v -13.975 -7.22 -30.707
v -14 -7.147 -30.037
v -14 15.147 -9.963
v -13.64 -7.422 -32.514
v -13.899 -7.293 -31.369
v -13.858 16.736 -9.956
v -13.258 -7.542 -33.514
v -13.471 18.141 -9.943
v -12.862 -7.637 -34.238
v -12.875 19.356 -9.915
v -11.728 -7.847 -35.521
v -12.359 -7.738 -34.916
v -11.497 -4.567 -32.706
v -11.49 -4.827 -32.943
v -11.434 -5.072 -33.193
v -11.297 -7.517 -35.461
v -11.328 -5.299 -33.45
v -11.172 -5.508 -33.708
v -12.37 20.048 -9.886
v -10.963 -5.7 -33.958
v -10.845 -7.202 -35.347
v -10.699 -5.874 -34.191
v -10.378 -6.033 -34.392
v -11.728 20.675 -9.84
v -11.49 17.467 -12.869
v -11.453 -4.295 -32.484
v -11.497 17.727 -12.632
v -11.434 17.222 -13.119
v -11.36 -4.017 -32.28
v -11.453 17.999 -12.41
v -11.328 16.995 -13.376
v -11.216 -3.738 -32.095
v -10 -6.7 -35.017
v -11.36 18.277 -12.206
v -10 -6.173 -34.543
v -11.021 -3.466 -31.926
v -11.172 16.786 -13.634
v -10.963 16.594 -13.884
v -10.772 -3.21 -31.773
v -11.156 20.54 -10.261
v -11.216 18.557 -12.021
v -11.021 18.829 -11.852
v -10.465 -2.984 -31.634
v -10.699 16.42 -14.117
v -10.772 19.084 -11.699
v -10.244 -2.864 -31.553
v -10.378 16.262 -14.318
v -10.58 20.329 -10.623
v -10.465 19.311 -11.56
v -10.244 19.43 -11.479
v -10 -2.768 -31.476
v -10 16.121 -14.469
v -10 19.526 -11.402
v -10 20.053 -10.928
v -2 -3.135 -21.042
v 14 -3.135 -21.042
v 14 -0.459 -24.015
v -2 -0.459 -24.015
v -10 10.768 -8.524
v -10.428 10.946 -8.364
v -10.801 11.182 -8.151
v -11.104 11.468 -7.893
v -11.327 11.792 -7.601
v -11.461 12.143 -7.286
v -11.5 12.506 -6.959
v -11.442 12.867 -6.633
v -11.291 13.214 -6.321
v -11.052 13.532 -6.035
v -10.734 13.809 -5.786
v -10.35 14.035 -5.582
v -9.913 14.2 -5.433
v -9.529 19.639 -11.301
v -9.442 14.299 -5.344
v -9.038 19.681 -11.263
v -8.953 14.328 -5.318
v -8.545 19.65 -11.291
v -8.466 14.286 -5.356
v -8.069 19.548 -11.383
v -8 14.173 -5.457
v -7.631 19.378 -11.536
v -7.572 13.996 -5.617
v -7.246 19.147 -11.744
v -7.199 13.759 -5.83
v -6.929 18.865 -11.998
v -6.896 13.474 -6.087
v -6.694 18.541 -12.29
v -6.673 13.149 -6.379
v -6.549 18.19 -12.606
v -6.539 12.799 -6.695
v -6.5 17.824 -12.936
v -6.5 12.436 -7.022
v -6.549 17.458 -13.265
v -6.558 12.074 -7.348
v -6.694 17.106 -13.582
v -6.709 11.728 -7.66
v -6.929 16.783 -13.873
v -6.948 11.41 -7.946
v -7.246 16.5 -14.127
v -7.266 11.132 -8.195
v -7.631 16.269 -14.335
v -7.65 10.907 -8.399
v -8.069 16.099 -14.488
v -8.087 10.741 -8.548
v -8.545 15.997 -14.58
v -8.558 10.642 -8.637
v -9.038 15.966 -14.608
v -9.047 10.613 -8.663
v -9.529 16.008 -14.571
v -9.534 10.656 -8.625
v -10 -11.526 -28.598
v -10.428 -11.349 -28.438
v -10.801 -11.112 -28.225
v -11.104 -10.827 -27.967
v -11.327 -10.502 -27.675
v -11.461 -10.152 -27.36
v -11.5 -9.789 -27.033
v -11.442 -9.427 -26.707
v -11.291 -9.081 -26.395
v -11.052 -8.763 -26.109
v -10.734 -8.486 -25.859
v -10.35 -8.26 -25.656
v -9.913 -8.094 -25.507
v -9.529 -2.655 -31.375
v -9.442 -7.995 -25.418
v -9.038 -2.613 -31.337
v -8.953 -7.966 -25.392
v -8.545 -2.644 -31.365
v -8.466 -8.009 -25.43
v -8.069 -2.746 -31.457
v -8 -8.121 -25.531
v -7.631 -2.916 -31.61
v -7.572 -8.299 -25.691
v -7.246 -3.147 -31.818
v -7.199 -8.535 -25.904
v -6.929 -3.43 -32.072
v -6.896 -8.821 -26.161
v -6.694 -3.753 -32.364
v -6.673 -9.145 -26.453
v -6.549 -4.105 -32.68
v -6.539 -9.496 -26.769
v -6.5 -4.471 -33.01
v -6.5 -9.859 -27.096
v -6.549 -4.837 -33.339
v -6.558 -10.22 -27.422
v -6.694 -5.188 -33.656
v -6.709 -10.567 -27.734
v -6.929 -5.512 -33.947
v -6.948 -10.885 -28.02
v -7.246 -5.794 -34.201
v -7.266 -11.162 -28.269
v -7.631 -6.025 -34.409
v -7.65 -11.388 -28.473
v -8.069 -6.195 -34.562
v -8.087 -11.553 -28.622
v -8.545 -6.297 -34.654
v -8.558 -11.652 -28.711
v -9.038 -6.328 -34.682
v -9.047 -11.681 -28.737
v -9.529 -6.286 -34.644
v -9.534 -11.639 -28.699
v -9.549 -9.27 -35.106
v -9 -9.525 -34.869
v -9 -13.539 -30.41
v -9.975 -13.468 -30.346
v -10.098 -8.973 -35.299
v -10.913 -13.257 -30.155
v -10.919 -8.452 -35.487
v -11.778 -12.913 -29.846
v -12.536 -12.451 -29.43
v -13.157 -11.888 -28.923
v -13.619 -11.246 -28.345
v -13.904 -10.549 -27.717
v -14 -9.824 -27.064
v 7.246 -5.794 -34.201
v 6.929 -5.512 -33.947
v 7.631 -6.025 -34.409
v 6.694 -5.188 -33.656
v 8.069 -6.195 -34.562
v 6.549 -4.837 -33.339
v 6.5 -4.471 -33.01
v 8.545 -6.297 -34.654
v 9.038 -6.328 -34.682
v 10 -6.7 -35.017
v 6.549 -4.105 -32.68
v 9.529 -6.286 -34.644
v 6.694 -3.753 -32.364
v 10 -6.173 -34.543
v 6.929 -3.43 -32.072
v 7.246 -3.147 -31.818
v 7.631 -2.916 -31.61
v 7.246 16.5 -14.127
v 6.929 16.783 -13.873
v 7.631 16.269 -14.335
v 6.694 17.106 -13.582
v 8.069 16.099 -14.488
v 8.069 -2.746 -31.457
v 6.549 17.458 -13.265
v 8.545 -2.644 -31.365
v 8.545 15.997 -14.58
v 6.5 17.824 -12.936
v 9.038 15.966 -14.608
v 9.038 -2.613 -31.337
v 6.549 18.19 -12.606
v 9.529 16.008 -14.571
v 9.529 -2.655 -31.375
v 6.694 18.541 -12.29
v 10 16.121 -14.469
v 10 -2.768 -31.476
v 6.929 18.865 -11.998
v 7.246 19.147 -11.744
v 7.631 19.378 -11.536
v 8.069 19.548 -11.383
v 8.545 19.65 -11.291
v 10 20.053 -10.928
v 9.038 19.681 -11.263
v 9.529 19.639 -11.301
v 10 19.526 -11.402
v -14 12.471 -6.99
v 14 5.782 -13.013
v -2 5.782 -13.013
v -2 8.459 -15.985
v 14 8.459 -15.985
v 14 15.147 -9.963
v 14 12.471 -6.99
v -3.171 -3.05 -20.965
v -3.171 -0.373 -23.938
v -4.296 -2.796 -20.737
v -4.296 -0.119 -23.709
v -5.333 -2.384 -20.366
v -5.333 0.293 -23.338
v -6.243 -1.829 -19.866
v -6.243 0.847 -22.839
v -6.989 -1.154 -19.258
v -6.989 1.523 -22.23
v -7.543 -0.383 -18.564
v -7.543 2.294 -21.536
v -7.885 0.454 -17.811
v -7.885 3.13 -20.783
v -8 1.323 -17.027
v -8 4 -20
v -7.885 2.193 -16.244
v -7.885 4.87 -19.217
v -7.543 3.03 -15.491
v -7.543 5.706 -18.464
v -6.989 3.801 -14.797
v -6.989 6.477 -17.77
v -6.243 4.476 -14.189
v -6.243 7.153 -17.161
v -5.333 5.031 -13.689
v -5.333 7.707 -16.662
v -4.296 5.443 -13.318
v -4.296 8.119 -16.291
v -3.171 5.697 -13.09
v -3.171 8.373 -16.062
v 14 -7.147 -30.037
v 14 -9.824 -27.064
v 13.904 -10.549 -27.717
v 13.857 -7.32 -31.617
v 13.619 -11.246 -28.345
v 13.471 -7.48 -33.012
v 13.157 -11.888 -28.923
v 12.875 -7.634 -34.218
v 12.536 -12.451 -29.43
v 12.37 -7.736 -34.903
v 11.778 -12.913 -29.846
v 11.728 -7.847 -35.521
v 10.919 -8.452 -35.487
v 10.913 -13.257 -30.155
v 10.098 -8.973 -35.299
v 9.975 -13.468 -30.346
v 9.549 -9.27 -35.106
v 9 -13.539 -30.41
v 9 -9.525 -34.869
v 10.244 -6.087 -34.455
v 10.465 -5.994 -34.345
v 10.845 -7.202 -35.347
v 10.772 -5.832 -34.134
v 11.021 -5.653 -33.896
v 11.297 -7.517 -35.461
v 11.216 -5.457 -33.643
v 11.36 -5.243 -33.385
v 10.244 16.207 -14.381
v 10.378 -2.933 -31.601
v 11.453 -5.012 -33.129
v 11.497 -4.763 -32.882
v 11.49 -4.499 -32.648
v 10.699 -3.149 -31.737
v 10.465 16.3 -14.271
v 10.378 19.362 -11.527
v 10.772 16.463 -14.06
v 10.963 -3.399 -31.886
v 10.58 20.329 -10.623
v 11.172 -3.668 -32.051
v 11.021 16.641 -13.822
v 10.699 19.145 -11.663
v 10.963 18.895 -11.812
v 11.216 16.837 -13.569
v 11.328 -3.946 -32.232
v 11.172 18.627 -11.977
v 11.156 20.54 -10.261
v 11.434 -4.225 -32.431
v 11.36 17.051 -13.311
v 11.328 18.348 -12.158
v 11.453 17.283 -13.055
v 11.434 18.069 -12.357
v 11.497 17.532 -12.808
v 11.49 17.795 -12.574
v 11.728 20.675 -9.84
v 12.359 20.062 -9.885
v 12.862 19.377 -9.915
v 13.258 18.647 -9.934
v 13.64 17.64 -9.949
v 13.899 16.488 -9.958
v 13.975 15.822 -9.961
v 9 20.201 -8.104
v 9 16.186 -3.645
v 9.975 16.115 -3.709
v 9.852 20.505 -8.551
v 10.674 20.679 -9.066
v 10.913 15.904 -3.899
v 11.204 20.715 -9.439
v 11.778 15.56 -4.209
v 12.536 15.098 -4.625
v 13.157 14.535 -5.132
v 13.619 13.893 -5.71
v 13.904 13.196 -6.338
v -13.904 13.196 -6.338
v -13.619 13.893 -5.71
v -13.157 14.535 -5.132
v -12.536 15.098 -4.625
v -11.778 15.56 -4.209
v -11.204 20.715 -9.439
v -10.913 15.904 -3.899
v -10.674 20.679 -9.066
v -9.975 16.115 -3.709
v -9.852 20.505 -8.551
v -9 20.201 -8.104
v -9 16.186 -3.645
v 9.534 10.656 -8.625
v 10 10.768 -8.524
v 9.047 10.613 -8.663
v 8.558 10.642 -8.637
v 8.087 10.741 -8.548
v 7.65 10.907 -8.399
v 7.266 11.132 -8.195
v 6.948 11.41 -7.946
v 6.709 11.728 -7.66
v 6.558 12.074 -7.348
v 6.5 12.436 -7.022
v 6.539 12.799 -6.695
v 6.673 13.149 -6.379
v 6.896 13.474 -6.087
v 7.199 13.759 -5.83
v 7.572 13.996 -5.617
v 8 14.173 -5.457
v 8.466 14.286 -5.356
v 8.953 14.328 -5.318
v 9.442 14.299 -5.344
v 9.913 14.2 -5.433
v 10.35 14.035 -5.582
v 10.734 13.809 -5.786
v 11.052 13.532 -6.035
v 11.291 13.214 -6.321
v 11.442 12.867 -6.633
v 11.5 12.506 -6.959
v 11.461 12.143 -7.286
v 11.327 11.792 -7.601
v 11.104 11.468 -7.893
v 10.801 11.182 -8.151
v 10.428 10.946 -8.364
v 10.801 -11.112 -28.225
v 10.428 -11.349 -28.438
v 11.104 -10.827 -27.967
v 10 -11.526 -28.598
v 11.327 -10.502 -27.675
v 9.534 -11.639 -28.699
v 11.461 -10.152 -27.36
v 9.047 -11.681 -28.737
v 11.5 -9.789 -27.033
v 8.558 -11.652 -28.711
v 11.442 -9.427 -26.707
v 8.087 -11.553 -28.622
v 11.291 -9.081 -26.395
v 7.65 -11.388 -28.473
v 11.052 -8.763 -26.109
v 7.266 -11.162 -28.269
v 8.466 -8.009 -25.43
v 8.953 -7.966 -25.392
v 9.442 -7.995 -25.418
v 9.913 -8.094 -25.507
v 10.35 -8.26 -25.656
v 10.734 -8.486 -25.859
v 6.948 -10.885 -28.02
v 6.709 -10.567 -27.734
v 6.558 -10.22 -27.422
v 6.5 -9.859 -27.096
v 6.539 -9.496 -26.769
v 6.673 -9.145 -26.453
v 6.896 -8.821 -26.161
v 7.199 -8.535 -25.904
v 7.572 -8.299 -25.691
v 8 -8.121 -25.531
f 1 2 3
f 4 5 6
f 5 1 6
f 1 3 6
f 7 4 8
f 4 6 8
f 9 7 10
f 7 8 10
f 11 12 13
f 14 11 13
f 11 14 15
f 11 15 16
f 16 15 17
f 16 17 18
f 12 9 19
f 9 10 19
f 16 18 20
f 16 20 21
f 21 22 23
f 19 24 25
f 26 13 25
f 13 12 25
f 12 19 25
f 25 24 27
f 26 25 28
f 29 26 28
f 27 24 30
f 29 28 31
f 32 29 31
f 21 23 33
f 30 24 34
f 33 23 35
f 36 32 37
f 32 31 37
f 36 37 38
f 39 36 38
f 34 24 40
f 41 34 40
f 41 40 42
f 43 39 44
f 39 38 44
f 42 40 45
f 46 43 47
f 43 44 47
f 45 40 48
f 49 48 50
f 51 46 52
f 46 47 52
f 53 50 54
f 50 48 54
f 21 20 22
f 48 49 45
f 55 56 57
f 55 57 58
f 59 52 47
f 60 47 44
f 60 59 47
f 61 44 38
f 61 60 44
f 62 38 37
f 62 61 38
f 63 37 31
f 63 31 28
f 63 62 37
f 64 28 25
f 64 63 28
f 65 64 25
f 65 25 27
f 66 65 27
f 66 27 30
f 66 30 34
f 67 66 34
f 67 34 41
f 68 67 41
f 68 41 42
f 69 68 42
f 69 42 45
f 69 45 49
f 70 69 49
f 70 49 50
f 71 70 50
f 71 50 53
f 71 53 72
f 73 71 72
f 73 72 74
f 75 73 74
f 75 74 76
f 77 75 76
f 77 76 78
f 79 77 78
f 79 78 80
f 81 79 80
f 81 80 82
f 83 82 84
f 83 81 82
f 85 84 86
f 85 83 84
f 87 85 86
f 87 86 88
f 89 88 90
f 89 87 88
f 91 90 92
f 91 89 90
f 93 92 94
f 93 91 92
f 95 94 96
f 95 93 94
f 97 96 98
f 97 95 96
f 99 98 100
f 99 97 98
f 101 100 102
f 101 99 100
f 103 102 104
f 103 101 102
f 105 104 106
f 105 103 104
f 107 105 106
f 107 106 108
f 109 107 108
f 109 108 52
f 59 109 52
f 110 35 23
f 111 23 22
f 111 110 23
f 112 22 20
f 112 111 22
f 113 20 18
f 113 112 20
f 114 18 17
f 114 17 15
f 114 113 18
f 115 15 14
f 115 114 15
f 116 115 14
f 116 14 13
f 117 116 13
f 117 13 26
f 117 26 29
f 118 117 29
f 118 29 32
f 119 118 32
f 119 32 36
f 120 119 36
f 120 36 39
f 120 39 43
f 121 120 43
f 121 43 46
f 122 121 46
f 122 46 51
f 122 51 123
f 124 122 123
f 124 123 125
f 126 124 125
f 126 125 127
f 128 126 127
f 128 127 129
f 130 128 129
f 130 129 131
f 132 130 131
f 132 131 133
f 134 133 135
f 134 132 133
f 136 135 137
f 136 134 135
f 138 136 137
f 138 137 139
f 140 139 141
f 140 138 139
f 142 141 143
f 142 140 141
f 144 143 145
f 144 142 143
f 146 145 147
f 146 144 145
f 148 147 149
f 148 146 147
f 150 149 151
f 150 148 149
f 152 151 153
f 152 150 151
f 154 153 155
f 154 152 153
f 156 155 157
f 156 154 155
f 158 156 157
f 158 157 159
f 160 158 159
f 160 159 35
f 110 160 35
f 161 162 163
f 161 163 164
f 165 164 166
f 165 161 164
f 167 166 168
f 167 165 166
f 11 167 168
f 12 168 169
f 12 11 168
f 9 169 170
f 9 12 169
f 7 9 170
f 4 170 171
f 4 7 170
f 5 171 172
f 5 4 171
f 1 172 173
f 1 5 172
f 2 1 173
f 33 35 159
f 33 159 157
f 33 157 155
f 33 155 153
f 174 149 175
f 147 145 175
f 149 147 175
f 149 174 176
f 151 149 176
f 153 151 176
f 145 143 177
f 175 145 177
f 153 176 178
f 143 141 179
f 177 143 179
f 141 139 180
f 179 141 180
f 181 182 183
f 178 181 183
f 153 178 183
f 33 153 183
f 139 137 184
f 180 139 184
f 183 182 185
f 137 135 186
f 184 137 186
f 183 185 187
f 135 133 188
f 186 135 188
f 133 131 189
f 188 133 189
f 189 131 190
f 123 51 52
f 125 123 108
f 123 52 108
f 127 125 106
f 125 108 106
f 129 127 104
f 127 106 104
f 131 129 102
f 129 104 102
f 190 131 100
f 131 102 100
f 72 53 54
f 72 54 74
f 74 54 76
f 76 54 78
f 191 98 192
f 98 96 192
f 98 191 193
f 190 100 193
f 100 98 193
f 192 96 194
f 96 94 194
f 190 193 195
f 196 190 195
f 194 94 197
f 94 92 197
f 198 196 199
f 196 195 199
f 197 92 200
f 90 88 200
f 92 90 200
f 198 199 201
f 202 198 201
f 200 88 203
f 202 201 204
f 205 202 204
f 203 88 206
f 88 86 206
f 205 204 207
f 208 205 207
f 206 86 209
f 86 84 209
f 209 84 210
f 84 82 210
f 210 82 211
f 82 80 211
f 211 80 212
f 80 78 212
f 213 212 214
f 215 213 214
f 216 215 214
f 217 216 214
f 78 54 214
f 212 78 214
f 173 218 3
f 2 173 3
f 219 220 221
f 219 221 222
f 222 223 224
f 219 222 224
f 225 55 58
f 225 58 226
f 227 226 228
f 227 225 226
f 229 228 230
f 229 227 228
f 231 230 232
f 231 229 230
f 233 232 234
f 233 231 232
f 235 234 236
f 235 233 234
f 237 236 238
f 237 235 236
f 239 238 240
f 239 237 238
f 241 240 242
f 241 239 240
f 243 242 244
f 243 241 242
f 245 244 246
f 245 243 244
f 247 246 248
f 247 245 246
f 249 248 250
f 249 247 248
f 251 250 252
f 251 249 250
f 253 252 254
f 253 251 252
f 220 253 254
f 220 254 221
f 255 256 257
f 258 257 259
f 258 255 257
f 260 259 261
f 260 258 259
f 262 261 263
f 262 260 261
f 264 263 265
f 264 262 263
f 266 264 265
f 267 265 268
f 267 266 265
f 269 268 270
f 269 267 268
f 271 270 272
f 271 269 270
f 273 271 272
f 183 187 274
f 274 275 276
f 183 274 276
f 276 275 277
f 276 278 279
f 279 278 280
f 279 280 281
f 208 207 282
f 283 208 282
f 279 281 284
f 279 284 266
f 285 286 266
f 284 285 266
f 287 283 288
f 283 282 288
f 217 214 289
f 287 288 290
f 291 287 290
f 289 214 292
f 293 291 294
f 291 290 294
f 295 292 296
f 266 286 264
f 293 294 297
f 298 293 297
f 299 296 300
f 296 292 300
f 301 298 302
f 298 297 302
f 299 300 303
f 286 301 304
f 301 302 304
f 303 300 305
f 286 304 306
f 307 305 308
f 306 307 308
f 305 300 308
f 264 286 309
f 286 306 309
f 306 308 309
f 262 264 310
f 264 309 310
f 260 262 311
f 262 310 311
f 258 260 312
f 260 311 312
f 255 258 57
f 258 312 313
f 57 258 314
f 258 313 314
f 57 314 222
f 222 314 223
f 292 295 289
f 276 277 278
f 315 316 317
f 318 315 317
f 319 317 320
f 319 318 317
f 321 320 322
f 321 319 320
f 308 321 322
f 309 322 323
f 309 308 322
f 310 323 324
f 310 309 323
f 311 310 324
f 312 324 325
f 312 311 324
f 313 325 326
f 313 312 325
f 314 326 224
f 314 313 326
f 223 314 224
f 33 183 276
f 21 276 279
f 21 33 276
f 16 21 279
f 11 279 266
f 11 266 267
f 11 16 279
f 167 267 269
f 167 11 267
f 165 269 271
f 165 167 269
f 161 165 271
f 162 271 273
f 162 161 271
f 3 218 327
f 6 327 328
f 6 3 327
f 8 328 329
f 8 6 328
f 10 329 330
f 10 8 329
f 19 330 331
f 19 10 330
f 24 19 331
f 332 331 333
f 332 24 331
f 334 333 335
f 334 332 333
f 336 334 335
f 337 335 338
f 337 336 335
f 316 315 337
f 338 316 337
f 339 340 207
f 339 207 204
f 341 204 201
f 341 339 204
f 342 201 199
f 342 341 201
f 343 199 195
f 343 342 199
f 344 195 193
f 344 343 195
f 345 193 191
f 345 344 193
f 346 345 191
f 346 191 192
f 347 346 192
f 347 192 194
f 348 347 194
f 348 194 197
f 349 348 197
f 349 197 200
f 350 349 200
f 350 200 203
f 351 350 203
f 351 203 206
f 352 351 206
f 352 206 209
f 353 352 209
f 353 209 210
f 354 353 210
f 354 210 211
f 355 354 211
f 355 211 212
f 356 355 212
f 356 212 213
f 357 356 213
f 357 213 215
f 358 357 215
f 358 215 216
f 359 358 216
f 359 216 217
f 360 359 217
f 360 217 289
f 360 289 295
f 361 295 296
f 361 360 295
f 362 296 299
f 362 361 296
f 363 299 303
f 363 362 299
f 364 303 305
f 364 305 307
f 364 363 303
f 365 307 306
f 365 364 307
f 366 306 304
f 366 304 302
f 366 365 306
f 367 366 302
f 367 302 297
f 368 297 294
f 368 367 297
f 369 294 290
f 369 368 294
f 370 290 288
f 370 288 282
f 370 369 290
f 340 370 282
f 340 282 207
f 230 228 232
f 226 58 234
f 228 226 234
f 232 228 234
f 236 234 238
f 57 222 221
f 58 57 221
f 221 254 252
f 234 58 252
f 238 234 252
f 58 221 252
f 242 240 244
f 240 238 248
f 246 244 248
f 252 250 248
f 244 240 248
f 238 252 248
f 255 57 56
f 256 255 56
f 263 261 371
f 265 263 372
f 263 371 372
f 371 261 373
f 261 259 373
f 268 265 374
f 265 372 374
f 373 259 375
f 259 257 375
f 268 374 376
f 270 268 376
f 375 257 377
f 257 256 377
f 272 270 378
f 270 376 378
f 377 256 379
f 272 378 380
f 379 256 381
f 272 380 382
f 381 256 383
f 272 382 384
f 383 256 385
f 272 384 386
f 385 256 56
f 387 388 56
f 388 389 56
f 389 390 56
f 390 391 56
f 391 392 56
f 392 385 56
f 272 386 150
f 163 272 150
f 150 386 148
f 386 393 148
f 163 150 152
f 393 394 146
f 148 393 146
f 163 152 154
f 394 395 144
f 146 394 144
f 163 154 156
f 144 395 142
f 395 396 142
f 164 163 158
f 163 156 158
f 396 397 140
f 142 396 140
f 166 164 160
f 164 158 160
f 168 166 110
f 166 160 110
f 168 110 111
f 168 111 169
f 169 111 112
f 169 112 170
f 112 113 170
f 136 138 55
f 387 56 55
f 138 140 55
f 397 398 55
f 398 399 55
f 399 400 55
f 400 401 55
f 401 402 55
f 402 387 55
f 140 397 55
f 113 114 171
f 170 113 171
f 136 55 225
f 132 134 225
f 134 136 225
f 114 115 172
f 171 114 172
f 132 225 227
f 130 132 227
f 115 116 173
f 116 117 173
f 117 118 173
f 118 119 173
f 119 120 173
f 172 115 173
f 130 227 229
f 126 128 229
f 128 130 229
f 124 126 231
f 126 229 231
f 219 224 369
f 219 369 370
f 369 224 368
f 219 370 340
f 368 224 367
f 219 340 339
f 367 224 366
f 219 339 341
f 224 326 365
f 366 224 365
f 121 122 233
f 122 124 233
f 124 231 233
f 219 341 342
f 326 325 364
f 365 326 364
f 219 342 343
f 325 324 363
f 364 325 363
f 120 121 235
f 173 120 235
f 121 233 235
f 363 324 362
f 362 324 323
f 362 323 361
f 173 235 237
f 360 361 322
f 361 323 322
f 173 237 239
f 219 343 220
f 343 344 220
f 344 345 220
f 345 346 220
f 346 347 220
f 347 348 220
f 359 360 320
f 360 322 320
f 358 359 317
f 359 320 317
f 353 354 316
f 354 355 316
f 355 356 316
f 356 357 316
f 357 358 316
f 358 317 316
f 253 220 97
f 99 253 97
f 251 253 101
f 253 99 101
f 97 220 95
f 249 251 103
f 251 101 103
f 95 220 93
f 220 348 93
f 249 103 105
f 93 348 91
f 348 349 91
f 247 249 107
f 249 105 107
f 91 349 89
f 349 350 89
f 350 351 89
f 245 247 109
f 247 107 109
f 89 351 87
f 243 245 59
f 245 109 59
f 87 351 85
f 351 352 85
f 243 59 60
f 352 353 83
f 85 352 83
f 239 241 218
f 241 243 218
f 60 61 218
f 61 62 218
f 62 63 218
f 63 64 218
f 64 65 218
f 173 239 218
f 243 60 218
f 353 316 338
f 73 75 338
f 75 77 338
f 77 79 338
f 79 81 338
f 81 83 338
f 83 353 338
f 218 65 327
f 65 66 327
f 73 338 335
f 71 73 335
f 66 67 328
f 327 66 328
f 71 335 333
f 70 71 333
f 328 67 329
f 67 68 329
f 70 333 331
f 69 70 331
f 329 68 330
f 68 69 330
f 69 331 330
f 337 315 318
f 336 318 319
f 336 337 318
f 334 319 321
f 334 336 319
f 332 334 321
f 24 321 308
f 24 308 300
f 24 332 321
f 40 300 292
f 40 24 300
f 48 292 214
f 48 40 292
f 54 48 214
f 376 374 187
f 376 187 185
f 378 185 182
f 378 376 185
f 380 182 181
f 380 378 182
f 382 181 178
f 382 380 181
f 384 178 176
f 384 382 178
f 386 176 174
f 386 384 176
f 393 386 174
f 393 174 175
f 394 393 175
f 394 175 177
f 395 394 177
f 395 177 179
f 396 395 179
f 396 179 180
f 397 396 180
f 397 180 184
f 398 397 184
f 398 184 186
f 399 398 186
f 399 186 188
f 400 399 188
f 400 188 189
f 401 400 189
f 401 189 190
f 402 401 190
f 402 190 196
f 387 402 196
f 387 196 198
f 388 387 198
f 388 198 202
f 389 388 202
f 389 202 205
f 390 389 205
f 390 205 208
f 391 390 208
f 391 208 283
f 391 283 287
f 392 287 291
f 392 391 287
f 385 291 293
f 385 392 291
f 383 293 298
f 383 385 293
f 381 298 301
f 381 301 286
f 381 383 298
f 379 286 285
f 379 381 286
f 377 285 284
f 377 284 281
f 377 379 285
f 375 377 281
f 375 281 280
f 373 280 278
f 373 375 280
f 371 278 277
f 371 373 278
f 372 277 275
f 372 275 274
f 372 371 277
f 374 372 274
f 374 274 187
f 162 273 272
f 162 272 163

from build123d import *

# Parameters (mm, degrees)
EXTRUDE_1_DEPTH     = 40
SKETCH_3_R          = 2.5
CUT_EXTRUDE_1_DEPTH = 44.127717306
SKETCH_5_OUTSIDE_W  = 39.896
SKETCH_5_OUTSIDE_H  = 51.896
CUT_EXTRUDE_3_DEPTH = 44.127717449
CUT_EXTRUDE_4_DEPTH = 4
MOVE_BODY_1_ANGLE   = 48
SKETCH_7_OUTSIDE_W  = 45.818
SKETCH_7_OUTSIDE_H  = 48.186
CUT_EXTRUDE_6_DEPTH = 50


with BuildPart() as part:
    # 草图2 → 凸台-拉伸1 (new body)
    with BuildSketch(Plane.XY):
        with BuildLine():
            Line((14, 0), (-14, 0))
            Line((-14, 0), (-14, 4))
            ThreePointArc((-14, 4), (-12.828427125, 6.828427125), (-10, 8))
            Line((-10, 8), (10, 8))
            ThreePointArc((10, 8), (12.828427125, 6.828427125), (14, 4))
            Line((14, 4), (14, 0))
        make_face()
    extrude(amount=-EXTRUDE_1_DEPTH)

    # 草图3 → 切除-拉伸1 (cut, through all)
    with BuildSketch(Plane(origin=(0, 0, 0), x_dir=(1, 0, 0), z_dir=(0, 1, 0))):
        with Locations(Location((-9, 35, 0), (0, 0, 113.578178478))):
            Circle(SKETCH_3_R)
        with Locations(Location((9, 35, 0), (0, 0, 66.421821522))):
            Circle(SKETCH_3_R)
        with Locations(Location((-9, 5, 0), (0, 0, 113.578178478))):
            Circle(SKETCH_3_R)
        with Locations(Location((9, 5, 0), (0, 0, 66.421821522))):
            Circle(SKETCH_3_R)
    extrude(amount=CUT_EXTRUDE_1_DEPTH, mode=Mode.SUBTRACT)

    # 草图5 outside → 切除-拉伸3 (cut, through all)
    with BuildSketch(Plane(origin=(0, 8, 0), x_dir=(1, 0, 0), z_dir=(0, 1, 0))):
        with Locations((0, 20)):
            Rectangle(SKETCH_5_OUTSIDE_W, SKETCH_5_OUTSIDE_H)
        with BuildLine():
            Line((14, 5), (14, 35))
            ThreePointArc((14, 35), (12.535533906, 38.535533906), (9, 40))
            Line((9, 40), (-9, 40))
            ThreePointArc((-9, 40), (-12.535533906, 38.535533906), (-14, 35))
            Line((-14, 35), (-14, 5))
            ThreePointArc((-14, 5), (-12.535533906, 1.464466094), (-9, 0))
            Line((-9, 0), (9, 0))
            ThreePointArc((9, 0), (12.535533906, 1.464466094), (14, 5))
        make_face(mode=Mode.SUBTRACT)
    extrude(amount=-CUT_EXTRUDE_3_DEPTH, mode=Mode.SUBTRACT)

    # 草图6 → 切除-拉伸4 (cut)
    with BuildSketch(Plane.XZ):
        with BuildLine():
            Line((14, -26), (-2, -26))
            ThreePointArc((-2, -26), (-8, -20), (-2, -14))
            Line((-2, -14), (14, -14))
            ThreePointArc((14, -14), (20, -20), (14, -26))
        make_face()
    extrude(amount=-CUT_EXTRUDE_4_DEPTH, mode=Mode.SUBTRACT)


with BuildPart() as part_1:
    # Move Body 1: moved
    add(part.part.rotate(Axis((0, 4, -20), (-1, 0, 0)), MOVE_BODY_1_ANGLE))

    # 草图7 outside → 切除-拉伸6 (cut)
    with BuildSketch(Plane.ZY.offset(14)):
        with Locations((-20, 4)):
            Rectangle(SKETCH_7_OUTSIDE_W, SKETCH_7_OUTSIDE_H)
        with BuildLine():
            Line((-6.990461603, 12.470649957), (-3.644808571, 16.186374084))
            Line((-3.644808571, 16.186374084), (-8.103677524, 20.201157722))
            ThreePointArc((-8.103677524, 20.201157722), (-9.546610649, 20.712127141), (-10.928228387, 20.053129284))
            Line((-10.928228387, 20.053129284), (-11.40244938, 19.526453515))
            Line((-11.40244938, 19.526453515), (-14.468791033, 16.1209361))
            Line((-14.468791033, 16.1209361), (-31.476367571, -2.767891249))
            Line((-31.476367571, -2.767891249), (-34.542709224, -6.173408664))
            Line((-34.542709224, -6.173408664), (-35.016930216, -6.700084433))
            ThreePointArc((-35.016930216, -6.700084433), (-35.527899635, -8.143017558), (-34.868901778, -9.524635297))
            Line((-34.868901778, -9.524635297), (-30.410032825, -13.539418935))
            Line((-30.410032825, -13.539418935), (-27.064379793, -9.823694808))
            Line((-27.064379793, -9.823694808), (-6.990461603, 12.470649957))
        make_face(mode=Mode.SUBTRACT)
    extrude(amount=-CUT_EXTRUDE_6_DEPTH, mode=Mode.SUBTRACT)


solid = part_1.part
